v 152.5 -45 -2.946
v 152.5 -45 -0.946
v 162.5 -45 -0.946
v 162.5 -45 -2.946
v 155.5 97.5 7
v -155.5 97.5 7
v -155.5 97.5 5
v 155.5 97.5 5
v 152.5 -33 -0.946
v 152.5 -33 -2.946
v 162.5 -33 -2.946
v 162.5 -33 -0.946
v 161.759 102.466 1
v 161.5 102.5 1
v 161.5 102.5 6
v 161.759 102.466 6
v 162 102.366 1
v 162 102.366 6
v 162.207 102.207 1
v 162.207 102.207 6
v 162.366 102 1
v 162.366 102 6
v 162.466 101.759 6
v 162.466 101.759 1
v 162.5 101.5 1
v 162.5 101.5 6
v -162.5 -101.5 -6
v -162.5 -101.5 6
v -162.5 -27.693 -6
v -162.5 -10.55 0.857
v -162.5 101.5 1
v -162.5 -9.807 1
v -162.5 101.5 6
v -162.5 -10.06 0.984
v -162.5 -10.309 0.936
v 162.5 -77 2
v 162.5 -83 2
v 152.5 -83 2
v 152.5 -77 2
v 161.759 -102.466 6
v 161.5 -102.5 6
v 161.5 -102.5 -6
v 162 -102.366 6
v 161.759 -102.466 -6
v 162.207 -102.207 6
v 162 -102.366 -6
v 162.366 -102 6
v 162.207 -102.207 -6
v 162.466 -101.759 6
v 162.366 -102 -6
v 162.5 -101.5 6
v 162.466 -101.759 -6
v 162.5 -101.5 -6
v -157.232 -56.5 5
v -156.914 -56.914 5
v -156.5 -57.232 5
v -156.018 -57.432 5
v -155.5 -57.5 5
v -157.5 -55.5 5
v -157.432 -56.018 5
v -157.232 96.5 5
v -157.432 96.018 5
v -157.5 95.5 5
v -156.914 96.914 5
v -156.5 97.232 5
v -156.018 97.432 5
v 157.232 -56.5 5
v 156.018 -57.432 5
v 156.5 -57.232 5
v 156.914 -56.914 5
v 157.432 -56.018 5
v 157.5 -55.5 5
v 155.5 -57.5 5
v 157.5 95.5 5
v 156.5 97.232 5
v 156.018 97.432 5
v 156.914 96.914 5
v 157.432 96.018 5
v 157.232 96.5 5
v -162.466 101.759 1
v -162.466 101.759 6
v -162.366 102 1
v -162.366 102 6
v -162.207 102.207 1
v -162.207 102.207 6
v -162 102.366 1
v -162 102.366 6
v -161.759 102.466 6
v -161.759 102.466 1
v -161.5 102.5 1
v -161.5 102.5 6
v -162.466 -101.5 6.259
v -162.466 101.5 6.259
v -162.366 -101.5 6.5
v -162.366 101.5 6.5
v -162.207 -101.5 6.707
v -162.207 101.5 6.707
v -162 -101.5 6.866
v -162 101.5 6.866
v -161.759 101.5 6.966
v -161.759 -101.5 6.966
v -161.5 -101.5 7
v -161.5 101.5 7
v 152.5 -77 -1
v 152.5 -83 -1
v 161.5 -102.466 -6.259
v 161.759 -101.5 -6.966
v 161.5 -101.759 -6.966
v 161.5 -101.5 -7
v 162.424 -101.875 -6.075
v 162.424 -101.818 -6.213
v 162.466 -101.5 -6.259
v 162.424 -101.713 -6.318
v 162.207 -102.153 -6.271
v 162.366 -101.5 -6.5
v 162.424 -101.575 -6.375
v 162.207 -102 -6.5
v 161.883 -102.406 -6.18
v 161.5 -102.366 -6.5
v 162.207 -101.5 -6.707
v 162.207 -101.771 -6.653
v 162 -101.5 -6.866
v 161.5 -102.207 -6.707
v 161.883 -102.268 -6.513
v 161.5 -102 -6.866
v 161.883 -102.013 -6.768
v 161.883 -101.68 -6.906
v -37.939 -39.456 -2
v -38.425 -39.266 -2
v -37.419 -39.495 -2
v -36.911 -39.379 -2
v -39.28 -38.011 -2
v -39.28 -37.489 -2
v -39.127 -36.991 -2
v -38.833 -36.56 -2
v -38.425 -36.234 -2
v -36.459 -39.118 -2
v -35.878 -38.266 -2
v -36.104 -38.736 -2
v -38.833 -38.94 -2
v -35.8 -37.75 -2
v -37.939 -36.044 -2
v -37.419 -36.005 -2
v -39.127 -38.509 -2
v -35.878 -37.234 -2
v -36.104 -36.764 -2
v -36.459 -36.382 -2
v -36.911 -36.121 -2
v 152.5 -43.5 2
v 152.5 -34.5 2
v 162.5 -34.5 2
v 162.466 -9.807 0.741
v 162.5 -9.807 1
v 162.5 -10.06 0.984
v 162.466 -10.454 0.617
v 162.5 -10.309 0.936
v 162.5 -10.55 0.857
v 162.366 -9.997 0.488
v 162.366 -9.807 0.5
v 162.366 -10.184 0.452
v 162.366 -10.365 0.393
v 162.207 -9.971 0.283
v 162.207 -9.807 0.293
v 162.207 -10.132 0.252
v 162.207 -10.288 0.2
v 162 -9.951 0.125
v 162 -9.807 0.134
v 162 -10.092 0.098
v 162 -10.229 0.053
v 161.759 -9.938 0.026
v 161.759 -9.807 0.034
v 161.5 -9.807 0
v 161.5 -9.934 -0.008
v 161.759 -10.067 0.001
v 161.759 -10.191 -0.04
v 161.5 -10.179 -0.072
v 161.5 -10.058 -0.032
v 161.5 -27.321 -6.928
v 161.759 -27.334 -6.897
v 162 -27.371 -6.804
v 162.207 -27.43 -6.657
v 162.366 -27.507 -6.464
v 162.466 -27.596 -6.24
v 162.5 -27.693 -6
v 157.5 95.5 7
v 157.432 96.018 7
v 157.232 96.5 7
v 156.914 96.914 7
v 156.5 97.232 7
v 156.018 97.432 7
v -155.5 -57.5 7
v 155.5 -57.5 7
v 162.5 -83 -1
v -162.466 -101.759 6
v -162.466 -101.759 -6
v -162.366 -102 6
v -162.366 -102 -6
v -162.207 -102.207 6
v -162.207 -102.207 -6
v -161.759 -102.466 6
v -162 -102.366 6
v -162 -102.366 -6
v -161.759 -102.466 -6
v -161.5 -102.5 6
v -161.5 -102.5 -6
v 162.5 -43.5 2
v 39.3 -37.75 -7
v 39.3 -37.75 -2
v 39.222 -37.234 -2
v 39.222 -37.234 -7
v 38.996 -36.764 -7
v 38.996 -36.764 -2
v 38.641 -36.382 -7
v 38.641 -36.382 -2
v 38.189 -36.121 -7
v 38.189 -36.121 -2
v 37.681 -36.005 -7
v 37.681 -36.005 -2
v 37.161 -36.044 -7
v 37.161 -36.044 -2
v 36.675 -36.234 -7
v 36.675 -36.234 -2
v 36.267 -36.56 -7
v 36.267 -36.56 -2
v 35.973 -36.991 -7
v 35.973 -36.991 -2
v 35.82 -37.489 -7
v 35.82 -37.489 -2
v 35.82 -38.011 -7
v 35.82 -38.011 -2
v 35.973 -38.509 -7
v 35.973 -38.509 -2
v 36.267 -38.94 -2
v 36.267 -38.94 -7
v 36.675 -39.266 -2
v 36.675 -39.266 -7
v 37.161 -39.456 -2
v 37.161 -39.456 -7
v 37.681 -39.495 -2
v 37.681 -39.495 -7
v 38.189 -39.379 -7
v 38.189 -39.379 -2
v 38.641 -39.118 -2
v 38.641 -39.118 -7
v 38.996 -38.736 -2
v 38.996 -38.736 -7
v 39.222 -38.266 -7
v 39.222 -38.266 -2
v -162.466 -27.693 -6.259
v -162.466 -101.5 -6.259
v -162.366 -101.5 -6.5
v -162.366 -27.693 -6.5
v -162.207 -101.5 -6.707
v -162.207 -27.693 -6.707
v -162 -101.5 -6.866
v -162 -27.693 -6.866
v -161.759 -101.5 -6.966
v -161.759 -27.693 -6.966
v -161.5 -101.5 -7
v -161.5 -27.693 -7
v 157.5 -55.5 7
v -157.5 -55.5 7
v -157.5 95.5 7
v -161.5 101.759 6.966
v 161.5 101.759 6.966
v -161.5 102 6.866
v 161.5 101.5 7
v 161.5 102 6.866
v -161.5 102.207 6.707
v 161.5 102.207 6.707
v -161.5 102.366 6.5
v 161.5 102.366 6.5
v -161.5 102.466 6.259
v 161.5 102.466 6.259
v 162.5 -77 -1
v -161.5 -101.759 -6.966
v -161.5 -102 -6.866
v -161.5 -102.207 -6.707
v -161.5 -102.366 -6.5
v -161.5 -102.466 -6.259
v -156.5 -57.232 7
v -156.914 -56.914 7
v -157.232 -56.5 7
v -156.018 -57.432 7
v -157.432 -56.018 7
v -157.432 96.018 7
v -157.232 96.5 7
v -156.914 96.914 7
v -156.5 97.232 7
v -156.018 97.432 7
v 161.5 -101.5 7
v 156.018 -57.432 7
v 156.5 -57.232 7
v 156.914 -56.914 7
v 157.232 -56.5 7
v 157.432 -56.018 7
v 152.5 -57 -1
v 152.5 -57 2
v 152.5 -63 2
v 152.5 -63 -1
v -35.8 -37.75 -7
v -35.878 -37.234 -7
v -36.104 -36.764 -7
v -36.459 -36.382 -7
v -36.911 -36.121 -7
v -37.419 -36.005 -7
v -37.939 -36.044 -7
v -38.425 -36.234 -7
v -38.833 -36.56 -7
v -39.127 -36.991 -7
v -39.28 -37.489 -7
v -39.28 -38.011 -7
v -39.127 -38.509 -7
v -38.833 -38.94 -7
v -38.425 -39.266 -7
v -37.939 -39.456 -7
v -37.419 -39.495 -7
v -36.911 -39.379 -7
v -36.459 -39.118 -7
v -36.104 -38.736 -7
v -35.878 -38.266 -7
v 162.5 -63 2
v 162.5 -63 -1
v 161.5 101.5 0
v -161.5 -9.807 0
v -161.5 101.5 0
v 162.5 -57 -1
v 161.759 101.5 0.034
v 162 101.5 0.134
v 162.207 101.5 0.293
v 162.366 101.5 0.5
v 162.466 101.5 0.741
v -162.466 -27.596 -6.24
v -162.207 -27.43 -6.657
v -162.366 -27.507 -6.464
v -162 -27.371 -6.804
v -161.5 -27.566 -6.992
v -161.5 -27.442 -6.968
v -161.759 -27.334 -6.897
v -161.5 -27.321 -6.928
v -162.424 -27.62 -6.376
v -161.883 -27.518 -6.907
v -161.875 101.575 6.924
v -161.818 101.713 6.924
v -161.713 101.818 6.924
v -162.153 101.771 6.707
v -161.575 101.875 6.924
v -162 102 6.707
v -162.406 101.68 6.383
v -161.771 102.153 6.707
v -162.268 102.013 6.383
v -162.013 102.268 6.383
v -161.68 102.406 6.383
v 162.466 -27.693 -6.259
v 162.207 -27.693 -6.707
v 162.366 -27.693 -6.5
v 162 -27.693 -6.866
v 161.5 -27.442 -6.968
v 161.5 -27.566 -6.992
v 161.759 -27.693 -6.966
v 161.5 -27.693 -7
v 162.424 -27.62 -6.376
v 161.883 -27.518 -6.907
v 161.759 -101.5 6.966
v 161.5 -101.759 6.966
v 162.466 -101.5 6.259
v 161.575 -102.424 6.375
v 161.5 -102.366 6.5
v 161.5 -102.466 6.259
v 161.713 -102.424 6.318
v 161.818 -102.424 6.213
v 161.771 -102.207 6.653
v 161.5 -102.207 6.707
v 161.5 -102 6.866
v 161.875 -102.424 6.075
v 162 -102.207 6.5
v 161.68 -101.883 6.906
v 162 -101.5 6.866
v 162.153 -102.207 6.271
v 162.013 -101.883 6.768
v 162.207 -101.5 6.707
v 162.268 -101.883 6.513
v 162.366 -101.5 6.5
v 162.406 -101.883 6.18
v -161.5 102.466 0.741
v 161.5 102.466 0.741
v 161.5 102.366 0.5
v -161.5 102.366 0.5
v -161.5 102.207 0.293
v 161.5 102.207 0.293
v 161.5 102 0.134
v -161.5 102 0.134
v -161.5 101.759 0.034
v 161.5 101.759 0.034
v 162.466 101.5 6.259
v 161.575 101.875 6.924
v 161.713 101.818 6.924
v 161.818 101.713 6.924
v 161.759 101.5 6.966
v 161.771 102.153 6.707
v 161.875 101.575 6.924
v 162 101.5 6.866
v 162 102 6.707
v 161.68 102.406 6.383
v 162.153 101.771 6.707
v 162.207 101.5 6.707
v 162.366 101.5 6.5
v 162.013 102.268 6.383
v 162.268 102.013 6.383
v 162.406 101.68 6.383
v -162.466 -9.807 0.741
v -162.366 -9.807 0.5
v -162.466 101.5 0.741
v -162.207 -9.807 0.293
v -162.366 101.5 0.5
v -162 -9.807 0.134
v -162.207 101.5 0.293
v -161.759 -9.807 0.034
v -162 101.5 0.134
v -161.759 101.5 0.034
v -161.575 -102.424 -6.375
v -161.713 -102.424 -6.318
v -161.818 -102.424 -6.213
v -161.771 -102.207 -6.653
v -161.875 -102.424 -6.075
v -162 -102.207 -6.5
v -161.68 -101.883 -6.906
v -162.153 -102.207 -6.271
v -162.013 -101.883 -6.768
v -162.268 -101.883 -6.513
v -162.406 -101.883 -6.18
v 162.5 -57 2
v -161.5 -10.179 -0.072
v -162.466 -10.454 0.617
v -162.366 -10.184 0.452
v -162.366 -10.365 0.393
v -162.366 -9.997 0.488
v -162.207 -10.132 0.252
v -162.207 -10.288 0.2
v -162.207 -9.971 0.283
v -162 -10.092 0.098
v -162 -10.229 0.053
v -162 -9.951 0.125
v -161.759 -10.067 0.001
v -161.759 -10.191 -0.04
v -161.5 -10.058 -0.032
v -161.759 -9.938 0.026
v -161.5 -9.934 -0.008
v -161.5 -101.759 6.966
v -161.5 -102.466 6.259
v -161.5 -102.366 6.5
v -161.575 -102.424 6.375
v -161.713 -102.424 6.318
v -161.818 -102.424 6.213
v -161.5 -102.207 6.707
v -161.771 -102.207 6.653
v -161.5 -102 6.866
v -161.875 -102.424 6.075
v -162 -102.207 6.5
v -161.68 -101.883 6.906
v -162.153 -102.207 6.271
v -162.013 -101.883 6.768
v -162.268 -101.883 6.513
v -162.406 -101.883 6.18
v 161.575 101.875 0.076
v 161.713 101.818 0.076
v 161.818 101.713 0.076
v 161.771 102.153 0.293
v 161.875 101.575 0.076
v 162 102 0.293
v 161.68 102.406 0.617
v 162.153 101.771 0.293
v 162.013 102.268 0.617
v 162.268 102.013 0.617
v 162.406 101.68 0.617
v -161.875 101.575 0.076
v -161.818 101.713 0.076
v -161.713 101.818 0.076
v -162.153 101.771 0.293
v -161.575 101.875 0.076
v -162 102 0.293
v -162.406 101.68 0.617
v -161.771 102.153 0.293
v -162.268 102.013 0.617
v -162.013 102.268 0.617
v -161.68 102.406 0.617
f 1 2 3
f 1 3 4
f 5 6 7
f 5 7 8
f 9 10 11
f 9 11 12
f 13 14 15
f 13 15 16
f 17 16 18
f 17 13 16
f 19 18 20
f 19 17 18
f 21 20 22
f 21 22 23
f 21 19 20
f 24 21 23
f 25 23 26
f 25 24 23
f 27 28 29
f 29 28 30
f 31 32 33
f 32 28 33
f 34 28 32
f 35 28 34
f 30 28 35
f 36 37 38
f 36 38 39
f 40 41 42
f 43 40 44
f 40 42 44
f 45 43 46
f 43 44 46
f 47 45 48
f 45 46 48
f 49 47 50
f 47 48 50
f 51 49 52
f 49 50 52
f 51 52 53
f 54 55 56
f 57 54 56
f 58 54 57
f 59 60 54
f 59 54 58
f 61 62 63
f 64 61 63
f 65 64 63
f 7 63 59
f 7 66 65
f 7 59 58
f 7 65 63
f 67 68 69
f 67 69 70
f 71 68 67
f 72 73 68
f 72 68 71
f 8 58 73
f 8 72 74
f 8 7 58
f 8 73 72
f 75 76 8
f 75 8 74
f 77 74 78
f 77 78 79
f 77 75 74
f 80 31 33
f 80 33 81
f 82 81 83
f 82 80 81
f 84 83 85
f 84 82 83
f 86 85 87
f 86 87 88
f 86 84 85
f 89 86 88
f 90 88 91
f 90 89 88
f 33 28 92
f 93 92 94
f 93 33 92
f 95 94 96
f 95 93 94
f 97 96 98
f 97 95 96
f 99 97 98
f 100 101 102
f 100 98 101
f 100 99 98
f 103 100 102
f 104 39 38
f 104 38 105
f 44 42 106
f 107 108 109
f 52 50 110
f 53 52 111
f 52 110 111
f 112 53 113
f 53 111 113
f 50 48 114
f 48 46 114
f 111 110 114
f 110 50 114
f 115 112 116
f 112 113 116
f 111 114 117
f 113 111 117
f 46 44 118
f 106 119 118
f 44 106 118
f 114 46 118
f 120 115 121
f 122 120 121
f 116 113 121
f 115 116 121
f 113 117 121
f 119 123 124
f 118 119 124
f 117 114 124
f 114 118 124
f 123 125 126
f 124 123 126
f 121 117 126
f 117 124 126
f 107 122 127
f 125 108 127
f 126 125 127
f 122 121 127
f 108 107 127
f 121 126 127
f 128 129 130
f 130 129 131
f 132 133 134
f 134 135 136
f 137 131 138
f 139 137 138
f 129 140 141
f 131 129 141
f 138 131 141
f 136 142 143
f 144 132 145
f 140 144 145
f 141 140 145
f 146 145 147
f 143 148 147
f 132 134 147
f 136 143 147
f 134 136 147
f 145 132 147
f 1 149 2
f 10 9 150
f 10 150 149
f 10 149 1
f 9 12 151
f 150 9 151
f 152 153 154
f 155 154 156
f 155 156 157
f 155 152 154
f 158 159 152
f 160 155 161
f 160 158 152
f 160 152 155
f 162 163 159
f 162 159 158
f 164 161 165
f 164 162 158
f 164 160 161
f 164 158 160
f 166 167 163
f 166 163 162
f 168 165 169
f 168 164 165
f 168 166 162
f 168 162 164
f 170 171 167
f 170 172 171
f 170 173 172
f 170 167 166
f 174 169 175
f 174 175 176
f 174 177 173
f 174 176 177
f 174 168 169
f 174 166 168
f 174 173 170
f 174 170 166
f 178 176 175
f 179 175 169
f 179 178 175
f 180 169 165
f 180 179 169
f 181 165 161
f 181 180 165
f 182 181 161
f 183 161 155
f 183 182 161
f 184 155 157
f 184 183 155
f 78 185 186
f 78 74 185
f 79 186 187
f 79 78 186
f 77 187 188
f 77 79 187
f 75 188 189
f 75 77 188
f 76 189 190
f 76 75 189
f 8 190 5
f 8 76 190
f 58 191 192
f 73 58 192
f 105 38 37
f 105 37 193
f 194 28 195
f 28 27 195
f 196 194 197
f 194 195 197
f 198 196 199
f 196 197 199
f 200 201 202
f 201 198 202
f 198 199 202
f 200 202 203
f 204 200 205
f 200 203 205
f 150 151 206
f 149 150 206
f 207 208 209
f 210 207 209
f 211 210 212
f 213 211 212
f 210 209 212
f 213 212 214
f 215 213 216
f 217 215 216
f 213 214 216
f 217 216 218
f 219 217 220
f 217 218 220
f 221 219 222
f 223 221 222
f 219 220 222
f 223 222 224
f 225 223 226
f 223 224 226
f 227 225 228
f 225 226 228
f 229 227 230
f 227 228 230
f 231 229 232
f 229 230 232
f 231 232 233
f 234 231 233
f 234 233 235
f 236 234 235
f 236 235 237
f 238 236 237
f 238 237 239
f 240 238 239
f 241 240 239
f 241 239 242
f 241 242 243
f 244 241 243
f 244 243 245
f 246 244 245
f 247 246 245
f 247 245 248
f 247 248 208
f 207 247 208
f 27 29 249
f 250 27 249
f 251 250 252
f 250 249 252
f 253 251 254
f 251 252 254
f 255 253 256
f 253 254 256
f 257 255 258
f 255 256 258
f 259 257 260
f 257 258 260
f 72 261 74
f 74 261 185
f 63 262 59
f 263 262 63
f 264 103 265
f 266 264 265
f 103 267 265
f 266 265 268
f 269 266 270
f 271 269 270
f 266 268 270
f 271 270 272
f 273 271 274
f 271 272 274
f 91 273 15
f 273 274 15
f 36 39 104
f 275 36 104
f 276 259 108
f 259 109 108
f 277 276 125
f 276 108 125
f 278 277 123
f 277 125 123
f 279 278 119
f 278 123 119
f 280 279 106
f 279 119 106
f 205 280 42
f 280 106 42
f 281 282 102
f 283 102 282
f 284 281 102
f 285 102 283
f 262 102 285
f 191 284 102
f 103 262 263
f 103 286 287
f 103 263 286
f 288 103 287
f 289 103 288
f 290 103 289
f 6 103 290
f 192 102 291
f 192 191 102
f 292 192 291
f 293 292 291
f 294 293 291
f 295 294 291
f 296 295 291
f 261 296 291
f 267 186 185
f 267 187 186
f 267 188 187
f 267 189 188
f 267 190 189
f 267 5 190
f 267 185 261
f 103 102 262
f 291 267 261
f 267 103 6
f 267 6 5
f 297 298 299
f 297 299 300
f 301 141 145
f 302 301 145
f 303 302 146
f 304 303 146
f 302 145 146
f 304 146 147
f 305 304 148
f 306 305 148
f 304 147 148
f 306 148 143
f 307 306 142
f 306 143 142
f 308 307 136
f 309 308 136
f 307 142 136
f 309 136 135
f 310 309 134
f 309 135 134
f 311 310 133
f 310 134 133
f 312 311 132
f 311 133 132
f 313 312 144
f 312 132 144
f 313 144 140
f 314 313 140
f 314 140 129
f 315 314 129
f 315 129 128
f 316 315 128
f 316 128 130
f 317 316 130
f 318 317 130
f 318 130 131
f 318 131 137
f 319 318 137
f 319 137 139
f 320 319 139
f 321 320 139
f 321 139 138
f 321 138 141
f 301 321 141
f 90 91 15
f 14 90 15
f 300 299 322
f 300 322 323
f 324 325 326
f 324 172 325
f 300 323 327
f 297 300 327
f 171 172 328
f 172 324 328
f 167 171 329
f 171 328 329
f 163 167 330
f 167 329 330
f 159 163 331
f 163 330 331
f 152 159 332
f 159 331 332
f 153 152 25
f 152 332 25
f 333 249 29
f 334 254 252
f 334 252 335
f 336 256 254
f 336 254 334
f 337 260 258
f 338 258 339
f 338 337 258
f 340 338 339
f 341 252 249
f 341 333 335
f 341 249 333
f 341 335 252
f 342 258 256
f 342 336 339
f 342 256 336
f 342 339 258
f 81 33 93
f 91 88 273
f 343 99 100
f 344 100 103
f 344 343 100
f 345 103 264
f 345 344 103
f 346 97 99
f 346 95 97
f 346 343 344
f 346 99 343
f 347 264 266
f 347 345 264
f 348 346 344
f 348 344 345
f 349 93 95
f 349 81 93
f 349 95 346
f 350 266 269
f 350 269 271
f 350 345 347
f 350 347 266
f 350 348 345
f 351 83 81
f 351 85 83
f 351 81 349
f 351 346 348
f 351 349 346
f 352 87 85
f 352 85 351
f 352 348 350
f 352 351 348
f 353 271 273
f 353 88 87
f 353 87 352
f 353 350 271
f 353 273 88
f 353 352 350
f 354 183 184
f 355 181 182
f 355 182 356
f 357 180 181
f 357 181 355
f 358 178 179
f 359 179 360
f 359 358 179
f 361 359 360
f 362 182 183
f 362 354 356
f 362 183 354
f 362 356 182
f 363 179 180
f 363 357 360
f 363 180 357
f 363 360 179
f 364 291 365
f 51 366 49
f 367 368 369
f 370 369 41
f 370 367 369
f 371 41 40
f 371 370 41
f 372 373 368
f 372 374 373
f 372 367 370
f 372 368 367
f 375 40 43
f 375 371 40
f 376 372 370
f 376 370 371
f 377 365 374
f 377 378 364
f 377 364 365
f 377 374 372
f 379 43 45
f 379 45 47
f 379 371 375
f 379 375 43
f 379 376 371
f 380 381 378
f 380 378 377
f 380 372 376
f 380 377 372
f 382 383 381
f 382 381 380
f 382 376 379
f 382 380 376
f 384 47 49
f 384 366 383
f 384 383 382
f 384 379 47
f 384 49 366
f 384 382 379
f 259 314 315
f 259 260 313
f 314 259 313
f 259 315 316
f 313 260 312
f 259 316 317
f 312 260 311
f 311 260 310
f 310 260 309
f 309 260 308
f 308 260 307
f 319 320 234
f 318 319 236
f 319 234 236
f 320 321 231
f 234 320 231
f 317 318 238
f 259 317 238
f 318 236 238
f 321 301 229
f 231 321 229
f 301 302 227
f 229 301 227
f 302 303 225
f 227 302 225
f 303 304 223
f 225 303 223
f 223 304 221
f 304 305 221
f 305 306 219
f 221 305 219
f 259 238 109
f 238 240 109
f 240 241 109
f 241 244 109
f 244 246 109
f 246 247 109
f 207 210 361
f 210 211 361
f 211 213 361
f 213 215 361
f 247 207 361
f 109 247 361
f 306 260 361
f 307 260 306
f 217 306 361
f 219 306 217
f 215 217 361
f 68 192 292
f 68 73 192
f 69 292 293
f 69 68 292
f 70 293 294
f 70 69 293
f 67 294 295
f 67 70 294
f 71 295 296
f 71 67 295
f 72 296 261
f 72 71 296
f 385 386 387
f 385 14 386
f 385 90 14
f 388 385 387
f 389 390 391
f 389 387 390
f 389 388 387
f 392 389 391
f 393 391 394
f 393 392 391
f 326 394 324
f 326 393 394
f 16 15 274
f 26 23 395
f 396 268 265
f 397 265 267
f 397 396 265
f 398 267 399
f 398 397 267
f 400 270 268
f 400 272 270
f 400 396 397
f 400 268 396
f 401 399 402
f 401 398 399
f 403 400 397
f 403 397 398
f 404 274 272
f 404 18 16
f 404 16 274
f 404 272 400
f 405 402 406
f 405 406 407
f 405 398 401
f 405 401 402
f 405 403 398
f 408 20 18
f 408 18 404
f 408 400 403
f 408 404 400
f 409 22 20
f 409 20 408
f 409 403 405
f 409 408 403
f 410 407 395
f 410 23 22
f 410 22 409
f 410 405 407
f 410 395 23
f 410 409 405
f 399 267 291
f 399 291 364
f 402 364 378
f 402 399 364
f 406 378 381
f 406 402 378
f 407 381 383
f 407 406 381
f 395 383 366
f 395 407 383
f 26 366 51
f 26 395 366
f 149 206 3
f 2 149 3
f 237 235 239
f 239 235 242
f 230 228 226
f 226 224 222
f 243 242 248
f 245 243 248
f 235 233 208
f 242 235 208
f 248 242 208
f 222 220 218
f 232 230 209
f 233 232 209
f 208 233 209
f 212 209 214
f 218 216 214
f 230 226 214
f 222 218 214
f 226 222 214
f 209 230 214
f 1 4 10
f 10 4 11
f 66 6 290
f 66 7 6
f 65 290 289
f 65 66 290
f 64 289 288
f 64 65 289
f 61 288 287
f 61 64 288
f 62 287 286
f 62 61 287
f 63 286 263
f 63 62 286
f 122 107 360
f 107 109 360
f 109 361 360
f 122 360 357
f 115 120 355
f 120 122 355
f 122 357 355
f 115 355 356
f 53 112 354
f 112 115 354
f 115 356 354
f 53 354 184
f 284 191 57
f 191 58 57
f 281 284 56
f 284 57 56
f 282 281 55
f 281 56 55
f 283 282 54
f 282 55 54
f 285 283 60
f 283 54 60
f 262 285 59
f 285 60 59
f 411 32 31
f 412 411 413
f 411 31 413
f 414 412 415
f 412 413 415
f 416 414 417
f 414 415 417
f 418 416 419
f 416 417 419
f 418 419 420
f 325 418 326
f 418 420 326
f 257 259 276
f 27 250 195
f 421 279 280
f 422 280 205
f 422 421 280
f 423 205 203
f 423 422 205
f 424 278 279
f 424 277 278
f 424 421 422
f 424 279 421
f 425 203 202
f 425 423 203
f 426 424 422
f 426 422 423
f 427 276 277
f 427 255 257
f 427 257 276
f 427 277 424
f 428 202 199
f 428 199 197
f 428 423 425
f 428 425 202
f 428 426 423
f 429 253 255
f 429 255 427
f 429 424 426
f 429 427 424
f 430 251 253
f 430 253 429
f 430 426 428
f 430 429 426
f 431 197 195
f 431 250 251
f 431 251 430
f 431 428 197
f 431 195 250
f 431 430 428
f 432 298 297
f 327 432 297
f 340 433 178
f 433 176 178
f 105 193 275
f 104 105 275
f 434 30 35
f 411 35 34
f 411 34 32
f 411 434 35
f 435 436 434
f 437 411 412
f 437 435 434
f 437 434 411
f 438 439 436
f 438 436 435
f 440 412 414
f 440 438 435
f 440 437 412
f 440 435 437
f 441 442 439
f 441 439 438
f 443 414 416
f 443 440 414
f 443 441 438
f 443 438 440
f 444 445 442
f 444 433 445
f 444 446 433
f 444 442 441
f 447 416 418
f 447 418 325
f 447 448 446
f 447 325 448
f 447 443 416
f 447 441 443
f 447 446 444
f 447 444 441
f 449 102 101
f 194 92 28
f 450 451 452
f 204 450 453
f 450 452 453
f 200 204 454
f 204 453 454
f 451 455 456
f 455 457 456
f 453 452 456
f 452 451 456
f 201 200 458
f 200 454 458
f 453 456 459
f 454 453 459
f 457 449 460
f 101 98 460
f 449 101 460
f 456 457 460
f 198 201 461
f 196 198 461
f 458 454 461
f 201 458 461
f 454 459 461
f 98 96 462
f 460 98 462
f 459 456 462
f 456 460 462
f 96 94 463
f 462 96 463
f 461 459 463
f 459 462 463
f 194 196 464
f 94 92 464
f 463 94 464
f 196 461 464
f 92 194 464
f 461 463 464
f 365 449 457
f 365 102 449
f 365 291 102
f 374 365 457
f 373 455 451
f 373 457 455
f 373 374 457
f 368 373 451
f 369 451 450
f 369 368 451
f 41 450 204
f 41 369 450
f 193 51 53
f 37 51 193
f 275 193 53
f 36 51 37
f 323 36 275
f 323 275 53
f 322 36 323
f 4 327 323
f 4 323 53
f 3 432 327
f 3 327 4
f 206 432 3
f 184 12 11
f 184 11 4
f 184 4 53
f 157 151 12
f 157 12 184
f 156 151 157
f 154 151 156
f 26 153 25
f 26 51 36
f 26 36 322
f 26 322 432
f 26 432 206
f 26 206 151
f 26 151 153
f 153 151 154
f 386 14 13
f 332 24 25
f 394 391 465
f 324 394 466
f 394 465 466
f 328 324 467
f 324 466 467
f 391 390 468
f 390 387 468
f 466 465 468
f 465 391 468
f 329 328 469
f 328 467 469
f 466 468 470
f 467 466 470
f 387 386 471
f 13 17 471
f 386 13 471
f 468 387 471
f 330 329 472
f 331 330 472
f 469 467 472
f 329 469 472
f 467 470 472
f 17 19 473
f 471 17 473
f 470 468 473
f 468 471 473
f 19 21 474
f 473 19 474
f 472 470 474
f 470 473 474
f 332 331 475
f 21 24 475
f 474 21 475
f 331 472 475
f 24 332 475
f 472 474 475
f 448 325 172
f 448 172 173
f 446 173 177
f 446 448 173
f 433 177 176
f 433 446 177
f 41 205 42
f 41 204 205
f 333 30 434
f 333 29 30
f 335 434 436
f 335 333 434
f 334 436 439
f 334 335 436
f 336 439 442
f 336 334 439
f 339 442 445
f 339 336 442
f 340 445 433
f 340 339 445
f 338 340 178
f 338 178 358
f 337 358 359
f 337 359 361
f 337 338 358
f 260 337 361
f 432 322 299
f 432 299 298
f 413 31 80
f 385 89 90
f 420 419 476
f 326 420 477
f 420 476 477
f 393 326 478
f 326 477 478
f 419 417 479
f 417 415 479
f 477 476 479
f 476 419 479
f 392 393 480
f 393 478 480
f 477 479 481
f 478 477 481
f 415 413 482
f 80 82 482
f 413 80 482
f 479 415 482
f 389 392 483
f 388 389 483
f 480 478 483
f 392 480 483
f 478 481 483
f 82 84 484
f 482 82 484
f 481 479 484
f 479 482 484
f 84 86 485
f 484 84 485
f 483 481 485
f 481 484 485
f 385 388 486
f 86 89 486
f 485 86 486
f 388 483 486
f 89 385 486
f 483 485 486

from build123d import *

# Parameters (mm, degrees)
SKETCH_1_W                  = 325
SKETCH_1_H                  = 205
EXTRUDE_1_DEPTH             = 14
SKETCH_2_W                  = 7
SKETCH_2_H                  = 130
CUT_EXTRUDE_1_DEPTH         = 341.852240714
CUT_EXTRUDE_2_DEPTH         = 10
SKETCH_4_W                  = 3
SKETCH_4_H                  = 6
CUT_EXTRUDE_3_DEPTH         = 10
SKETCH_5_W                  = 3
SKETCH_5_H                  = 6
CUT_EXTRUDE_4_DEPTH         = 10
SKETCH_6_W                  = 315
SKETCH_6_H                  = 155
CUT_EXTRUDE_5_DEPTH         = 2
DRAFT_1_ANGLE               = 68.198590514
HOLE_WIZARD_3_5_3_5_1_D     = 3.5
HOLE_WIZARD_3_5_3_5_1_DEPTH = 5
FILLET_1_R                  = 1
FILLET_2_R                  = 2


with BuildPart() as part:
    # 草图1 → 凸台-拉伸1 (new body)
    with BuildSketch(Plane.XY.offset(7)):
        Rectangle(SKETCH_1_W, SKETCH_1_H)
    extrude(amount=-EXTRUDE_1_DEPTH)

    # 草图2 → 切除-拉伸1 (cut, through all)
    with BuildSketch(Plane(origin=(162.5, 0, 0), x_dir=(0, 0, -1), z_dir=(1, 0, 0))):
        with Locations((3.5, 37.5)):
            Rectangle(SKETCH_2_W, SKETCH_2_H)
    extrude(amount=-CUT_EXTRUDE_1_DEPTH, mode=Mode.SUBTRACT)

    # 草图3 → 切除-拉伸2 (cut)
    with BuildSketch(Plane(origin=(162.5, 0, 0), x_dir=(0, 0, -1), z_dir=(1, 0, 0))):
        Polygon((-2, -43.5), (0.946428571, -45), (2.946428571, -45), (2.946428571, -33), (0.946428571, -33), (-2, -34.5), align=None)
    extrude(amount=-CUT_EXTRUDE_2_DEPTH, mode=Mode.SUBTRACT)

    # 草图4 → 切除-拉伸3 (cut)
    with BuildSketch(Plane(origin=(162.5, 0, 0), x_dir=(0, 0, -1), z_dir=(1, 0, 0))):
        with Locations((-0.5, -60)):
            Rectangle(SKETCH_4_W, SKETCH_4_H)
    extrude(amount=-CUT_EXTRUDE_3_DEPTH, mode=Mode.SUBTRACT)

    # 草图5 → 切除-拉伸4 (cut)
    with BuildSketch(Plane(origin=(162.5, 0, 0), x_dir=(0, 0, -1), z_dir=(1, 0, 0))):
        with Locations((-0.5, -80)):
            Rectangle(SKETCH_5_W, SKETCH_5_H)
    extrude(amount=-CUT_EXTRUDE_4_DEPTH, mode=Mode.SUBTRACT)

    # 草图6 → 切除-拉伸5 (cut)
    with BuildSketch(Plane.XY.offset(7)):
        with Locations((0, 20)):
            Rectangle(SKETCH_6_W, SKETCH_6_H)
    extrude(amount=-CUT_EXTRUDE_5_DEPTH, mode=Mode.SUBTRACT)

    # 拔模1
    draft_1_faces = [part.faces().sort_by_distance(p)[0] for p in [
        (0, -27.5, -3.5),
    ]]
    draft(draft_1_faces, Plane(origin=(0, 0, -7), x_dir=(-1, 0, 0), z_dir=(0, 0, -1)), DRAFT_1_ANGLE)

    # Ø3.5 (3.5) 直径孔1
    with Locations(Plane(origin=(0, 0, -7), x_dir=(-1, 0, 0), z_dir=(0, 0, -1))):
        with Locations((-37.55, -37.75), (37.55, -37.75)):
            Hole(HOLE_WIZARD_3_5_3_5_1_D / 2, depth=HOLE_WIZARD_3_5_3_5_1_DEPTH)

    # 圆角1
    fillet_1_edges = [part.edges().sort_by_distance(p)[0] for p in [
        (-162.5, -65, -7),
        (162.5, 102.5, 3.5),
        (-162.5, 102.5, 3.5),
        (-162.5, -18.75, -3.5),
        (0, -27.5, -7),
        (-162.5, 46.25, 0),
        (0, -10, 0),
        (0, 102.5, 0),
        (162.5, 46.25, 0),
        (162.5, -18.75, -3.5),
        (0, -102.5, -7),
        (-162.5, 0, 7),
        (0, 102.5, 7),
        (162.5, 0, 7),
        (0, -102.5, 7),
        (-162.5, -102.5, 0),
        (162.5, -102.5, 0),
        (162.5, -65, -7),
    ]]
    fillet(fillet_1_edges, radius=FILLET_1_R)

    # 圆角2
    fillet_2_edges = [part.edges().sort_by_distance(p)[0] for p in [
        (-157.5, -57.5, 6),
        (-157.5, 97.5, 6),
        (157.5, 97.5, 6),
        (157.5, -57.5, 6),
    ]]
    fillet(fillet_2_edges, radius=FILLET_2_R)


solid = part.part
